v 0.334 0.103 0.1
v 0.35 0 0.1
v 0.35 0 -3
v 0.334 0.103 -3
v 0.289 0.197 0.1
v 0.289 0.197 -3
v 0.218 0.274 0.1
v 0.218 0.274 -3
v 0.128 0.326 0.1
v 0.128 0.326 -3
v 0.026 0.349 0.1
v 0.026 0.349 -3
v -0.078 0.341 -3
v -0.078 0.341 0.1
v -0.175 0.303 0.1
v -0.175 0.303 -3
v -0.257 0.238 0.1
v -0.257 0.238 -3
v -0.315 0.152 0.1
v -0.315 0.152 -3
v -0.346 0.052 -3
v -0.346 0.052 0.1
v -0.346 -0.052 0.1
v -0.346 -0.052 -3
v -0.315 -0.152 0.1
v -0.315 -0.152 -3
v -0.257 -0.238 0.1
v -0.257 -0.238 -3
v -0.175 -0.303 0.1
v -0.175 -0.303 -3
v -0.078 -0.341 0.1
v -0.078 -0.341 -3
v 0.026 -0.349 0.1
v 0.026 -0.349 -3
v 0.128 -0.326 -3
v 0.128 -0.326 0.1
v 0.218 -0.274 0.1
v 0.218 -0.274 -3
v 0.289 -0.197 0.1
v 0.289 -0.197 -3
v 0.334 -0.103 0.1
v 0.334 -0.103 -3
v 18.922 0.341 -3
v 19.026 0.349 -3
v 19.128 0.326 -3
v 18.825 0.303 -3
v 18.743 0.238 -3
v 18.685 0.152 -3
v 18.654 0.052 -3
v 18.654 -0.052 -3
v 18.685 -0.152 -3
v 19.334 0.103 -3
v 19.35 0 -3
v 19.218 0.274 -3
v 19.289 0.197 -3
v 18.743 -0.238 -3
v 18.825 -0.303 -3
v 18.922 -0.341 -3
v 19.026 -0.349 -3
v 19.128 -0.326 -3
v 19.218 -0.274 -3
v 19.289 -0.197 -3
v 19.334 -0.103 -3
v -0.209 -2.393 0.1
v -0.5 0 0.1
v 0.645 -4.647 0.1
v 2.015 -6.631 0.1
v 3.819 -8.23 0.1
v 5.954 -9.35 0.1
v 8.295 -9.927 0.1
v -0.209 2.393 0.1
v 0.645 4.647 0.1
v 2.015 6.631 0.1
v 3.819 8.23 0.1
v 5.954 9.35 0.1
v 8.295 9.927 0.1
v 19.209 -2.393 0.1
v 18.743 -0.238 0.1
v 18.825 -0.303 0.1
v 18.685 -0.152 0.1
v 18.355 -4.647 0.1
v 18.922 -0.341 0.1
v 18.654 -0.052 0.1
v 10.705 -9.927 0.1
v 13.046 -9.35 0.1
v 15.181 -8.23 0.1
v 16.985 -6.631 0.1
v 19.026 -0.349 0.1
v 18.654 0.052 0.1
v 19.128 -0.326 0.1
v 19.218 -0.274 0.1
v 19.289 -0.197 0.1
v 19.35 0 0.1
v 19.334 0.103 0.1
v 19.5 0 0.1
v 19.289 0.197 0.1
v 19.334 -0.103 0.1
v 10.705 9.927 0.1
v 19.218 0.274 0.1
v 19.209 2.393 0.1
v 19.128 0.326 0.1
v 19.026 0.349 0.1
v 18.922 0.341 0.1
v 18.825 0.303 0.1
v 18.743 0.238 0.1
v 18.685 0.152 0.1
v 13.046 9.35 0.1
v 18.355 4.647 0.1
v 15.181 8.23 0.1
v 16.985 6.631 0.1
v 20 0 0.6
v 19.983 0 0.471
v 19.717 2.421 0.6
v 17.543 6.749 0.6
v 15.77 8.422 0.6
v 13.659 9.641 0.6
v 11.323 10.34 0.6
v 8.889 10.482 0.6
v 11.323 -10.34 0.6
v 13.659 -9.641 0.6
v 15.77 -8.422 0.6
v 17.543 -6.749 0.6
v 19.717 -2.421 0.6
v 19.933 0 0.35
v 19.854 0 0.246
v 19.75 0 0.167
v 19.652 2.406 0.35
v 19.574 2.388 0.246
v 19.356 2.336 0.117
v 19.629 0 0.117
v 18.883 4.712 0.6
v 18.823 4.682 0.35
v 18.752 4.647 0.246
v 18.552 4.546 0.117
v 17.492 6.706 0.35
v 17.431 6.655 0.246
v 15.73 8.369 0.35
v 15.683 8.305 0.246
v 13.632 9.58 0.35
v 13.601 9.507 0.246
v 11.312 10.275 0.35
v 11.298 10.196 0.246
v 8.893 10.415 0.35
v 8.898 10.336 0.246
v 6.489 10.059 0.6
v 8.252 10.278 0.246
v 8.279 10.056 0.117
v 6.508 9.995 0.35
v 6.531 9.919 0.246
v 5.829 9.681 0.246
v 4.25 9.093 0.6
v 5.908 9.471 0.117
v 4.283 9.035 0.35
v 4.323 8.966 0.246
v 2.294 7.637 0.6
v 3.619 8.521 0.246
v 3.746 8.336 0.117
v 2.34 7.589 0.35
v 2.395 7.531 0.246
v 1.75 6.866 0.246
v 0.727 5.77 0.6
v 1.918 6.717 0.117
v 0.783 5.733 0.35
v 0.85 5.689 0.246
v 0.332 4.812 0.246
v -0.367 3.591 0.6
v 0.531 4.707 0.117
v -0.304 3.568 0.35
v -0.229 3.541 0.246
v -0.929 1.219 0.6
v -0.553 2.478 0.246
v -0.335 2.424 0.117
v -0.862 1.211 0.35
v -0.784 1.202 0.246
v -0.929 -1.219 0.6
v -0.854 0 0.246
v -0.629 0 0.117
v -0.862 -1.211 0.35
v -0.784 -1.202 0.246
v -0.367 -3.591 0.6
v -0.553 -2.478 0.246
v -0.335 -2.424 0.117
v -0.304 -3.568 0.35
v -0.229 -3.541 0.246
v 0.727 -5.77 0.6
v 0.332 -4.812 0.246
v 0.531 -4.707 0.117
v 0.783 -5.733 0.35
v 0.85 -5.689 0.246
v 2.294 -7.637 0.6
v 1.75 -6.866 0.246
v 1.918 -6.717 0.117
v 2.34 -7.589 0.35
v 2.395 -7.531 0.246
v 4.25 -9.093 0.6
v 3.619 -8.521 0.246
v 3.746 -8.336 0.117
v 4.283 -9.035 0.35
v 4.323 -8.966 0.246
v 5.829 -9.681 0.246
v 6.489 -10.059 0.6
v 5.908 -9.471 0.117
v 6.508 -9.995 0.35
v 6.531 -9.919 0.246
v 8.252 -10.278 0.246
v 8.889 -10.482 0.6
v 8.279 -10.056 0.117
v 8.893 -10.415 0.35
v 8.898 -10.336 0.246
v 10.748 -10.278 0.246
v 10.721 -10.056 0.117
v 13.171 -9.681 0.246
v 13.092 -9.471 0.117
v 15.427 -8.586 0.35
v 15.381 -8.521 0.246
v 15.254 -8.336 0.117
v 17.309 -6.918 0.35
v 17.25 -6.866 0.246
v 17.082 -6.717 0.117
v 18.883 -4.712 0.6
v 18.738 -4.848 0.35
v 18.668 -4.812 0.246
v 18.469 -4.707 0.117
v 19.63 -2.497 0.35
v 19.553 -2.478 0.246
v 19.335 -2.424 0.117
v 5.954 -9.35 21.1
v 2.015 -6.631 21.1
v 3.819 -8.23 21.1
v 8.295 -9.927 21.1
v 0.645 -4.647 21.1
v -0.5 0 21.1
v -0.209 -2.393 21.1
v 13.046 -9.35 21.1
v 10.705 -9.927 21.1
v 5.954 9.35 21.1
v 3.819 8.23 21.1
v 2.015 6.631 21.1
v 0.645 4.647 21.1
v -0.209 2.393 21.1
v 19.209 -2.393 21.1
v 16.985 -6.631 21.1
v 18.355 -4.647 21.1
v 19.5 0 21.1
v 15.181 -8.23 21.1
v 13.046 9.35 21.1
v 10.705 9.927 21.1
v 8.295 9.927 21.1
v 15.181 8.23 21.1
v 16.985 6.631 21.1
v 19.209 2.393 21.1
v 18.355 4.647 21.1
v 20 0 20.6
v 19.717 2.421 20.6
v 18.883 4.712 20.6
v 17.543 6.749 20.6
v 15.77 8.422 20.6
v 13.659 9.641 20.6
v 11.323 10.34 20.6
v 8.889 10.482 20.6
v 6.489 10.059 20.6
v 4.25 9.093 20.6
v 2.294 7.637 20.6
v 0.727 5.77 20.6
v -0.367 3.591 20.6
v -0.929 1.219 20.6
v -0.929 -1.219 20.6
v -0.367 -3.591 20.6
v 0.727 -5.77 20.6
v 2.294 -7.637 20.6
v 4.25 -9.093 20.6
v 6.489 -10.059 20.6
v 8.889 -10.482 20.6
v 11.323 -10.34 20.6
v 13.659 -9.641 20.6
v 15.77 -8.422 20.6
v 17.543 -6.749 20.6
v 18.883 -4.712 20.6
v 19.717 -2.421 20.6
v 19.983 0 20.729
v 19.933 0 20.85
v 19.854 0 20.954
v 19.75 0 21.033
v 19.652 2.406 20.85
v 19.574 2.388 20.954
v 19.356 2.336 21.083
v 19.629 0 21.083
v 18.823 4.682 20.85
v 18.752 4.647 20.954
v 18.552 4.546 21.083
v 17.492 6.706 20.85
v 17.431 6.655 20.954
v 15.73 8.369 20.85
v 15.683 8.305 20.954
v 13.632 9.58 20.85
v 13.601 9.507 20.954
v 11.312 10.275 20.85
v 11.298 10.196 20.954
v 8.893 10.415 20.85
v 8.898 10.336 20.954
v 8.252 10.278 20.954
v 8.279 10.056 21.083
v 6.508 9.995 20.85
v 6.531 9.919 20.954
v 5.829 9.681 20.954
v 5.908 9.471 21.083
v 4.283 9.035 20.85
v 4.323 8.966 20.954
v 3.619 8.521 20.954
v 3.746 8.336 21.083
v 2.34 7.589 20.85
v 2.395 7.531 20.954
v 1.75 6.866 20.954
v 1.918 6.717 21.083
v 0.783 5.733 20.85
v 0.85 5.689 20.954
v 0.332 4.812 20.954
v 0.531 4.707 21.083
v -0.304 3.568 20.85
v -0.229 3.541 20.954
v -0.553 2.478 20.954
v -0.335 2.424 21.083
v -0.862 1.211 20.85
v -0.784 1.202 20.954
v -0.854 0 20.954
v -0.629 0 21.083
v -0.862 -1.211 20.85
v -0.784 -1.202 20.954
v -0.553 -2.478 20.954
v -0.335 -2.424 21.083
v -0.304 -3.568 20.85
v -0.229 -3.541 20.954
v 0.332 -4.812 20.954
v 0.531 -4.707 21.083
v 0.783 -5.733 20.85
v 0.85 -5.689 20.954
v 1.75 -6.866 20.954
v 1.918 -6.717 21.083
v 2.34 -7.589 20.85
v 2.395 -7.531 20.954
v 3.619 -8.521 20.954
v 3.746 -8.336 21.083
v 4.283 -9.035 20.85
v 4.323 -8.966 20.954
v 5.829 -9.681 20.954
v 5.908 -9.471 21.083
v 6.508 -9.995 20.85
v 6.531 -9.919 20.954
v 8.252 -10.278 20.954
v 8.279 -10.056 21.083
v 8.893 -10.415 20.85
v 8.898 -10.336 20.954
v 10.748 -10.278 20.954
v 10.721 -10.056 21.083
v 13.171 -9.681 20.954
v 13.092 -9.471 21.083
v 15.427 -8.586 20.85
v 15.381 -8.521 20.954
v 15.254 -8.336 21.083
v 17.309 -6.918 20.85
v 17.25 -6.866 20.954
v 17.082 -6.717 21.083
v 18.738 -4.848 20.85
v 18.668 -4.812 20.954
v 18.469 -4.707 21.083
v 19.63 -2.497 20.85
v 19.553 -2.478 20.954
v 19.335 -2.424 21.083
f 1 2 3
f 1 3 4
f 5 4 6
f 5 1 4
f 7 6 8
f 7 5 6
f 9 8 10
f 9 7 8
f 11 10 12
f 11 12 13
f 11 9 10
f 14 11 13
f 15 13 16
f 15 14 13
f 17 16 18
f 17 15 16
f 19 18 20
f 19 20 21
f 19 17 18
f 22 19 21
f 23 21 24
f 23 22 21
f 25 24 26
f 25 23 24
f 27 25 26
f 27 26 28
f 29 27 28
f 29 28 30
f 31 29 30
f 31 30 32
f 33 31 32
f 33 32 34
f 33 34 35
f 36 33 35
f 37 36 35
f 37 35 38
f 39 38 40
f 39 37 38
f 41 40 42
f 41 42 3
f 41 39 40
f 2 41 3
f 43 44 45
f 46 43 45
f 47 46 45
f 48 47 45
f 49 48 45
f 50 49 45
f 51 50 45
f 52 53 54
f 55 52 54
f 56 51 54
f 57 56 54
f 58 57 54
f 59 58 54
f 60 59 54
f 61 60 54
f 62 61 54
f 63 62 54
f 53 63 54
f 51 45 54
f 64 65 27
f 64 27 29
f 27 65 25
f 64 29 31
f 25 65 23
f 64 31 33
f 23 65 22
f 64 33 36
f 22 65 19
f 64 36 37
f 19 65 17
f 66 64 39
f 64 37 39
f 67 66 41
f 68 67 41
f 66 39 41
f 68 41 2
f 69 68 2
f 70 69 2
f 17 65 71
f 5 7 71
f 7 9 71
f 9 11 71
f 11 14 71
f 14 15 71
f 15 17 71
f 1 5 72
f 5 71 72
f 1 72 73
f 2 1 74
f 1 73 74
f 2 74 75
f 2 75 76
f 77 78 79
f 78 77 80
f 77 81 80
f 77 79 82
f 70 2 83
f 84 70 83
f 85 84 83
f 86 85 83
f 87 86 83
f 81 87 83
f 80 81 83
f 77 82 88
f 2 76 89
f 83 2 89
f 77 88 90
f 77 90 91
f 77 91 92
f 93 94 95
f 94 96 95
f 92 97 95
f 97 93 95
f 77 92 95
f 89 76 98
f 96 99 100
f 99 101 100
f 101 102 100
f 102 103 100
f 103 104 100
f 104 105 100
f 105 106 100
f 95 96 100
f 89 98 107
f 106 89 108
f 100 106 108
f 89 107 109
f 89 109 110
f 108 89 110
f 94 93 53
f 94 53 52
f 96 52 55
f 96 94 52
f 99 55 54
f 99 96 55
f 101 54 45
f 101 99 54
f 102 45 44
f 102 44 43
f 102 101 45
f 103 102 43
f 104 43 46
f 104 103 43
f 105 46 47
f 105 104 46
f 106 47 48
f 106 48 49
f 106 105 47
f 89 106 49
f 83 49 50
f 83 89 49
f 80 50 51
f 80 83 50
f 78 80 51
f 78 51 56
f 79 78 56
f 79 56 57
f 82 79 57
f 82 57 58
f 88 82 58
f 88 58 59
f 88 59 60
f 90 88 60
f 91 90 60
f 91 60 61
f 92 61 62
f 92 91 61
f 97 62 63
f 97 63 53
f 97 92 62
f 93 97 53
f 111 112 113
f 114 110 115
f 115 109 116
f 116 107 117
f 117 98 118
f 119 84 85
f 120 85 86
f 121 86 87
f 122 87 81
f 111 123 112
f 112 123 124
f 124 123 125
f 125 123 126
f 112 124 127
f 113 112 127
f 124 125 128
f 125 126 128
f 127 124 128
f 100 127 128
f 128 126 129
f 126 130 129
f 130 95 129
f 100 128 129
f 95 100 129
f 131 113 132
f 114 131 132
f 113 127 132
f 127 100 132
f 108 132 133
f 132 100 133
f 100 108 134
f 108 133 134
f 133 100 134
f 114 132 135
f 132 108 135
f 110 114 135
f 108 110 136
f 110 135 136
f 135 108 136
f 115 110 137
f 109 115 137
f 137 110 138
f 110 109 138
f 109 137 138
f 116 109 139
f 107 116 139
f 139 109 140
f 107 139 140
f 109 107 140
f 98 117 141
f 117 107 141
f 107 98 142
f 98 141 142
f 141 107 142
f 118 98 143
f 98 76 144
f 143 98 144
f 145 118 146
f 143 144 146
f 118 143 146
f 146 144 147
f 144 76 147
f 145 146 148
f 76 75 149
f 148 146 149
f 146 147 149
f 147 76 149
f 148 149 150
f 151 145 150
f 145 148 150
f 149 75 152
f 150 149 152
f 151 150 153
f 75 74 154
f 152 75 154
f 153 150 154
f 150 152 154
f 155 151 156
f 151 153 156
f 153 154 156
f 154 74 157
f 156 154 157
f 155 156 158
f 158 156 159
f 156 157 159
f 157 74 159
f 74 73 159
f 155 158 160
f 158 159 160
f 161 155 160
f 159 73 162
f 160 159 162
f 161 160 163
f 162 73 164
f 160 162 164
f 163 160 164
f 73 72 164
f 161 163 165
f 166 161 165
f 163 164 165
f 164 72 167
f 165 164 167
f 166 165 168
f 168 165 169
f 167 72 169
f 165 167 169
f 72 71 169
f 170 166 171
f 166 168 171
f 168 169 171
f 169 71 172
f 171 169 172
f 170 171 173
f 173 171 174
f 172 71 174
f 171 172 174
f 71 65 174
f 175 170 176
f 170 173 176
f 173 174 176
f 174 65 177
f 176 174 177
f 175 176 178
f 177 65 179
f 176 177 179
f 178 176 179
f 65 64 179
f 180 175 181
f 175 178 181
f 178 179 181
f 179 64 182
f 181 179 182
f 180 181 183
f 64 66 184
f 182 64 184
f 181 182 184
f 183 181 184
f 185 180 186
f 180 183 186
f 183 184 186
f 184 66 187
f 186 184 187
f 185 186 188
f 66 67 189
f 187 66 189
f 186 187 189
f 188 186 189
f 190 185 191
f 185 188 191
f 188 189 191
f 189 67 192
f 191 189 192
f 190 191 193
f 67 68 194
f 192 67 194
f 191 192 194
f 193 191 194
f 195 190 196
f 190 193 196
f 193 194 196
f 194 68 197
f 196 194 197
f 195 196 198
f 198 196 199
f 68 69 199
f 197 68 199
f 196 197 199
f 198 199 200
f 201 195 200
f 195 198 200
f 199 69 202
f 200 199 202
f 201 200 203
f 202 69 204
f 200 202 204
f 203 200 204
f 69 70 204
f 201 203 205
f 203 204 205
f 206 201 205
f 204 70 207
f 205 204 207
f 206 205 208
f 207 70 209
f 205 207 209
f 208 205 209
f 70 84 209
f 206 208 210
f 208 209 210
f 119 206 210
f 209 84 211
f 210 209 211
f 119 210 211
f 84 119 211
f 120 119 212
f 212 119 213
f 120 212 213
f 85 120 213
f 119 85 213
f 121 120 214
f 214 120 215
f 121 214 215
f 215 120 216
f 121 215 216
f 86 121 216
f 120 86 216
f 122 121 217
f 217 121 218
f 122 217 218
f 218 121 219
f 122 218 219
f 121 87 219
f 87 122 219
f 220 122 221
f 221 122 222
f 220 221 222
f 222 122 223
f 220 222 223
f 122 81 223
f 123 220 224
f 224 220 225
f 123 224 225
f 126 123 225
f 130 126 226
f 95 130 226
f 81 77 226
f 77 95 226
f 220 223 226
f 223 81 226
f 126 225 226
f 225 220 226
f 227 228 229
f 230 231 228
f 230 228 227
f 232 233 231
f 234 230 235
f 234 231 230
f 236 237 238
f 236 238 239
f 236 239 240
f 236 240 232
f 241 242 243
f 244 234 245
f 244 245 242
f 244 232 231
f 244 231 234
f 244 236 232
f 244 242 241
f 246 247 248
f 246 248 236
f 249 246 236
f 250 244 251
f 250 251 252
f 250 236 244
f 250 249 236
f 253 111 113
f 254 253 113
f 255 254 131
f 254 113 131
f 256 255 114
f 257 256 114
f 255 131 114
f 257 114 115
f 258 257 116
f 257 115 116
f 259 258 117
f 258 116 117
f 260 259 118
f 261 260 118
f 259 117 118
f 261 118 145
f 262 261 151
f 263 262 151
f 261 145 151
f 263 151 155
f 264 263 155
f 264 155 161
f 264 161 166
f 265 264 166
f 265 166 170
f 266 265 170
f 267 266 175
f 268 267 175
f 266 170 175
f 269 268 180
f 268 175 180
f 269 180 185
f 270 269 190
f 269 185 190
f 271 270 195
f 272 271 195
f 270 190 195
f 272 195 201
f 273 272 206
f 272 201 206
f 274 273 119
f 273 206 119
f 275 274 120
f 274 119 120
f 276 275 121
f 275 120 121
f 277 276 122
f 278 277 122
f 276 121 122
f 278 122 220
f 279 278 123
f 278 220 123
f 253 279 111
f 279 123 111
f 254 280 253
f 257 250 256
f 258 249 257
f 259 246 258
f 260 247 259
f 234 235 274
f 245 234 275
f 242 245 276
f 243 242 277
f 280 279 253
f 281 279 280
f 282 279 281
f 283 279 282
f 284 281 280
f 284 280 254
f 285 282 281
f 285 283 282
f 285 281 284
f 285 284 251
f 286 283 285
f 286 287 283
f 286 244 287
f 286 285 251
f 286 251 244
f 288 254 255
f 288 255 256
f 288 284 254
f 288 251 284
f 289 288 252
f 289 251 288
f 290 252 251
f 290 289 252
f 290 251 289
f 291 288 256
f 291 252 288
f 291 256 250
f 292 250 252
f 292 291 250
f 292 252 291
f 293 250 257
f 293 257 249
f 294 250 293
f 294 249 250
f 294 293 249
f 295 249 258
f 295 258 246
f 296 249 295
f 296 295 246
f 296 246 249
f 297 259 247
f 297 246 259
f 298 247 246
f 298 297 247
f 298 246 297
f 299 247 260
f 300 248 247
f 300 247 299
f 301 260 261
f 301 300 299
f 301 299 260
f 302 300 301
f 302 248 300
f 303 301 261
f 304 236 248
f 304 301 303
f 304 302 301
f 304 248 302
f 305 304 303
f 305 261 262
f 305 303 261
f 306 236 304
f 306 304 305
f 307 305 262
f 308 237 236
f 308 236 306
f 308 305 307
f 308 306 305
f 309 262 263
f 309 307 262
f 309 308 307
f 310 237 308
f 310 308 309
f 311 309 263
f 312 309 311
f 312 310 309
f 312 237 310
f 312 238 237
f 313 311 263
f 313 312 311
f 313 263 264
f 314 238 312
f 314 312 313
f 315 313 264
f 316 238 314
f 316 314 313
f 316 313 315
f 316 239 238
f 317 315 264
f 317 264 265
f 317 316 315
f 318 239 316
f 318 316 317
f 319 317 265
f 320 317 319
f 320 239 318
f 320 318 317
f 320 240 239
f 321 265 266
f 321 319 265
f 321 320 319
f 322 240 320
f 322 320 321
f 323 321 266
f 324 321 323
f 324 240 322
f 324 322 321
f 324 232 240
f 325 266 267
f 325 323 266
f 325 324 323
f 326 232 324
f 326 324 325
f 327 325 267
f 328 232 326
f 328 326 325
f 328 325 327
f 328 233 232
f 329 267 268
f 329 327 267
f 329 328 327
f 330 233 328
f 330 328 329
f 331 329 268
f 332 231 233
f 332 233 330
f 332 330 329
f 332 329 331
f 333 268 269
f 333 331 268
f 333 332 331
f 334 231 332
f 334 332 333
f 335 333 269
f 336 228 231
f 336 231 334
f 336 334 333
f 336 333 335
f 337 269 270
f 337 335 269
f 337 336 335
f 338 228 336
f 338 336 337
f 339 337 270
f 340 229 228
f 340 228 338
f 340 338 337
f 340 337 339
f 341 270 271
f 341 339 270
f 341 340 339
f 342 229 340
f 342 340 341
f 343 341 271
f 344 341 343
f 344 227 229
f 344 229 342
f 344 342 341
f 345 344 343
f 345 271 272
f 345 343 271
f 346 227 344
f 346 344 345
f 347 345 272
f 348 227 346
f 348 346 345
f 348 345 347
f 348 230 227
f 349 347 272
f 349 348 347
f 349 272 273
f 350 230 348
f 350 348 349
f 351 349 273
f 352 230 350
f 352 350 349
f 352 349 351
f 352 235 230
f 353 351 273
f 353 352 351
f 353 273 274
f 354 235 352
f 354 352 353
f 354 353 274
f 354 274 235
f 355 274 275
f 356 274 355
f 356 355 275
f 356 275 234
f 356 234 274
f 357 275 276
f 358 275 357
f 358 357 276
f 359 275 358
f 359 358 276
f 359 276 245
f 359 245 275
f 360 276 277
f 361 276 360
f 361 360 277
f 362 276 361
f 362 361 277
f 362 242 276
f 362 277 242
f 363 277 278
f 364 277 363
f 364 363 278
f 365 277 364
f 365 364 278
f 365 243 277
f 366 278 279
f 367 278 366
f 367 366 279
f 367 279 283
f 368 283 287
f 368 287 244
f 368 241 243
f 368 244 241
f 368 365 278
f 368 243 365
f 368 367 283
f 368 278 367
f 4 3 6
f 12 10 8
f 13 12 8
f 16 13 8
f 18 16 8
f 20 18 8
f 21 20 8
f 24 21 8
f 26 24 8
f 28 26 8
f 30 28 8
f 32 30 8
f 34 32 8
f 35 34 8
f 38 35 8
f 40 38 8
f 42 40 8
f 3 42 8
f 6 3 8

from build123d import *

# Parameters (mm, degrees)
SKETCH001_R       = 0.35
PAD001_DEPTH      = 10.5
PAD001_DEPTH_BACK = 3.5
SKETCH_R          = 10.5
PAD_DEPTH         = 21
FILLET_R          = 0.5


with BuildPart() as pad001:
    # Sketch001 → Pad001 (new body, two sides)
    with BuildSketch(Plane.XY.offset(0.5)) as pad001_sk:
        Circle(SKETCH001_R)
        with Locations((19, 0)):
            Circle(SKETCH001_R)
    extrude(amount=PAD001_DEPTH)
    extrude(pad001_sk.sketch, amount=-PAD001_DEPTH_BACK)


with BuildPart() as l_radial_d21_0mm_p19_00mm:
    # Sketch → Pad (new body)
    with BuildSketch(Plane.XY.offset(0.1)):
        with Locations((9.5, 0)):
            Circle(SKETCH_R)
    extrude(amount=PAD_DEPTH)

    # Fillet
    fillet_edges = [l_radial_d21_0mm_p19_00mm.edges().sort_by_distance(p)[0] for p in [
        (-1, 0, 0.1),
        (-1, 0, 21.1),
    ]]
    fillet(fillet_edges, radius=FILLET_R)

    # Fillet_mp_cp: union Pad001
    add(pad001.part)


solid = l_radial_d21_0mm_p19_00mm.part
